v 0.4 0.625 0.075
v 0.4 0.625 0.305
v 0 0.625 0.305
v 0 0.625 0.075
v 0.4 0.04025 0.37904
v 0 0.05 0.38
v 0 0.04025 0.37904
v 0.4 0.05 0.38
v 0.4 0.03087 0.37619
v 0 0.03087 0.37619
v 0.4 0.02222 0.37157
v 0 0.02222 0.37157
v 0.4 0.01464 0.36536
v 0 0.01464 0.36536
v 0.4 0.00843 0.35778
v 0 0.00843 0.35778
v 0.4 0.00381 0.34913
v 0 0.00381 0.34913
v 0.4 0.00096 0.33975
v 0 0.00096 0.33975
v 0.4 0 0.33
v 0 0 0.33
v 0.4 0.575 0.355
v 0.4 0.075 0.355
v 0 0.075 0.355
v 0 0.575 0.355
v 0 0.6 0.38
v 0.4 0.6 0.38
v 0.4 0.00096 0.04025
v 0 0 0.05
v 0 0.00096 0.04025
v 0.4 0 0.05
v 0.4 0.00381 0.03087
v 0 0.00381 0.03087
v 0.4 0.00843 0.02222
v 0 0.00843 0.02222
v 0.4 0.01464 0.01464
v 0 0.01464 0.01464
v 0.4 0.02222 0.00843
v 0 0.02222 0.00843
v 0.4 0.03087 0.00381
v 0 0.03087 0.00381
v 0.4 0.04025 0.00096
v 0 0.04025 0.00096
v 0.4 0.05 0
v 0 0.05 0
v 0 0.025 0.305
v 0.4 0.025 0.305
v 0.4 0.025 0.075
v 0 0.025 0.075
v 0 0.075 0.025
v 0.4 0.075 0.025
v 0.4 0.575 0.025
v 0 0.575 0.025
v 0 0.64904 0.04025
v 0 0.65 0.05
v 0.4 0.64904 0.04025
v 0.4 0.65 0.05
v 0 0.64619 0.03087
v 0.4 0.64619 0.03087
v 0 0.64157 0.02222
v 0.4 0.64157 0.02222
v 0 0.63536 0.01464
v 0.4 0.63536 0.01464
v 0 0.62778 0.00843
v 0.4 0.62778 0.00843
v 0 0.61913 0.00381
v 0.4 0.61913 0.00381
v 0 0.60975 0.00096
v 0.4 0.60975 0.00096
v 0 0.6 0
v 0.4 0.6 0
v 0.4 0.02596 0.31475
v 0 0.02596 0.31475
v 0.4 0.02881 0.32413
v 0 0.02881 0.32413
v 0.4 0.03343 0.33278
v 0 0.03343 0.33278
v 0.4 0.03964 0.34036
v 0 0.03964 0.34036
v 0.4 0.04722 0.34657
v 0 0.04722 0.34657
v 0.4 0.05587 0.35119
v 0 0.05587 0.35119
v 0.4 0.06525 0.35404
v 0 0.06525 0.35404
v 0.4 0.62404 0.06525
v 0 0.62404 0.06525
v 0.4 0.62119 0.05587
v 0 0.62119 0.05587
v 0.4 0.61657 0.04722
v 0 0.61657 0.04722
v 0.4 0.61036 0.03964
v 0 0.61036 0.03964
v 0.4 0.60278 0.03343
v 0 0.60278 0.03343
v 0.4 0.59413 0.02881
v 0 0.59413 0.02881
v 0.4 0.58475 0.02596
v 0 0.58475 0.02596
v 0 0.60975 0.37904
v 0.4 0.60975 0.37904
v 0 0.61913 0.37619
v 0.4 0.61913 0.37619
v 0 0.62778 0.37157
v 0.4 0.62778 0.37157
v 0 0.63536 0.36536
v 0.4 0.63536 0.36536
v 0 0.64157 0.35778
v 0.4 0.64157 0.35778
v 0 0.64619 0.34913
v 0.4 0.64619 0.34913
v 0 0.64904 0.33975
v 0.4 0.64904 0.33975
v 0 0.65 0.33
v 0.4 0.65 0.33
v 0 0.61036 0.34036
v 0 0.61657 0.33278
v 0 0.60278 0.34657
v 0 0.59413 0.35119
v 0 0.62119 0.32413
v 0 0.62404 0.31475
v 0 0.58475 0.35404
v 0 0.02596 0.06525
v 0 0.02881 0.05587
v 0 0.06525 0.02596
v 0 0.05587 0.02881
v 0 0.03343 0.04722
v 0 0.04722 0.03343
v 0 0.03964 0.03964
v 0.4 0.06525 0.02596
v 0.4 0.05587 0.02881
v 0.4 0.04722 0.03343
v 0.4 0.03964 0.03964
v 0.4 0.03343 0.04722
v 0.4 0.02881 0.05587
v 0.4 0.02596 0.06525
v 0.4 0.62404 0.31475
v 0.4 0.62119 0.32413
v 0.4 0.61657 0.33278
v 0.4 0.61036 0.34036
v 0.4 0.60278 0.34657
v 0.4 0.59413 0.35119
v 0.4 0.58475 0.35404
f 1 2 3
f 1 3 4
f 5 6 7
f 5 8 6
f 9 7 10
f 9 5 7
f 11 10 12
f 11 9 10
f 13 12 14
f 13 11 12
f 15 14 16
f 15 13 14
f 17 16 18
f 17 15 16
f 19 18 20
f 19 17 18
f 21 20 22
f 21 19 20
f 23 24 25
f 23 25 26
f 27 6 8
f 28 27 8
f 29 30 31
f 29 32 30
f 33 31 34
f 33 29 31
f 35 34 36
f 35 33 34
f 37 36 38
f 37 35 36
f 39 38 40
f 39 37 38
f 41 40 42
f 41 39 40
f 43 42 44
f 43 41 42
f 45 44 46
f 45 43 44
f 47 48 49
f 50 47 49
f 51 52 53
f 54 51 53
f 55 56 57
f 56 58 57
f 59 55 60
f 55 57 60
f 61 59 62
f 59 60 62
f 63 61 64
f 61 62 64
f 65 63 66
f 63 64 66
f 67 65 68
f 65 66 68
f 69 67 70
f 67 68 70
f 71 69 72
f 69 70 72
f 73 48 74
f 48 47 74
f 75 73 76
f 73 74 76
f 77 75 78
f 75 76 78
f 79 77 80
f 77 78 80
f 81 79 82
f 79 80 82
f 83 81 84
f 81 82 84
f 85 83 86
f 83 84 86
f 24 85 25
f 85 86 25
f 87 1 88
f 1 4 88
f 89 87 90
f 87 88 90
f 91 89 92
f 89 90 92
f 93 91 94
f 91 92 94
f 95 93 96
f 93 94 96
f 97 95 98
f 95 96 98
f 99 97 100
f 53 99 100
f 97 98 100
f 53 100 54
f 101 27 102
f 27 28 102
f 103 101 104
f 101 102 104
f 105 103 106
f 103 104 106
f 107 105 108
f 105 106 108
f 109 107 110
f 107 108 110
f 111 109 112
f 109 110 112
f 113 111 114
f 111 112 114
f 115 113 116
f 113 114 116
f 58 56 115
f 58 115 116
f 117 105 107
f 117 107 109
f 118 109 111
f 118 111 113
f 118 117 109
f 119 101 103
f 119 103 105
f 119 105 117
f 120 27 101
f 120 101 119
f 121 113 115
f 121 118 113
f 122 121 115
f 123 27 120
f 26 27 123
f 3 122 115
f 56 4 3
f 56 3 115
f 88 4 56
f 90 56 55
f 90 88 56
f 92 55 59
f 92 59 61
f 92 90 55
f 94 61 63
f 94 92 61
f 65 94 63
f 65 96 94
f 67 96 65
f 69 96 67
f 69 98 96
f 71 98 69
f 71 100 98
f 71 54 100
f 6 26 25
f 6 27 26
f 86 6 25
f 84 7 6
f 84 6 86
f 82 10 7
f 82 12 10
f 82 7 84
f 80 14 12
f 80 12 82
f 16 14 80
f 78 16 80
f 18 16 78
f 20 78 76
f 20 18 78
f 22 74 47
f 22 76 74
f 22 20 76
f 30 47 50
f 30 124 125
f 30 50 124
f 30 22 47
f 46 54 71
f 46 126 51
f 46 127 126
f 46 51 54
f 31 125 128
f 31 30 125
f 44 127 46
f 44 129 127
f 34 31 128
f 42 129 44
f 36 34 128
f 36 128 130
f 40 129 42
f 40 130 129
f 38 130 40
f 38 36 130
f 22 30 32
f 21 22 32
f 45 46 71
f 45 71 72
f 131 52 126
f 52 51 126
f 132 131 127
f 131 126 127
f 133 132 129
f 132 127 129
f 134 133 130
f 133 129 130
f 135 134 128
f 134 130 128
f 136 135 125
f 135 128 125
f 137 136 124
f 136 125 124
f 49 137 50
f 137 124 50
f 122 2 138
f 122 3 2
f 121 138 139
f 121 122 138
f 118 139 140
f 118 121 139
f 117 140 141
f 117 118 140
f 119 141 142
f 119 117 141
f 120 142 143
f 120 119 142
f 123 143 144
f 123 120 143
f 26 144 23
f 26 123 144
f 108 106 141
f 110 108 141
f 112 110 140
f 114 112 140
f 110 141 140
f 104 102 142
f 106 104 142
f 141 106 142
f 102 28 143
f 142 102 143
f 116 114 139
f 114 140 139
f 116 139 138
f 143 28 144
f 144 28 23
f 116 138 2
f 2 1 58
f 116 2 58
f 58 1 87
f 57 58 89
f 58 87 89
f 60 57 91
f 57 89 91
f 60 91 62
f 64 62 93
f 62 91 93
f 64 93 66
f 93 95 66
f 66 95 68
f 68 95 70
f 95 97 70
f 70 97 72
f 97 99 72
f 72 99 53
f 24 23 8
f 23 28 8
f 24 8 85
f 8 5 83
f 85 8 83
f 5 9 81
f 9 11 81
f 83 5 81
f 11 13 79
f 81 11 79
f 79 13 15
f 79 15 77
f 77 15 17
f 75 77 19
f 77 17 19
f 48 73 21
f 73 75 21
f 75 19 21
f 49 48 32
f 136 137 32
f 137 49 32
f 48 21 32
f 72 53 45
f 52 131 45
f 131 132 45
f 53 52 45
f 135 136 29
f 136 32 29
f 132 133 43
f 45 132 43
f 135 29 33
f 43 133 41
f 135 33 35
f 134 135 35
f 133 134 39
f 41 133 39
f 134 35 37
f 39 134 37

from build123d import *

# Parameters (mm, degrees)
SKETCH1_W               = 0.4
SKETCH1_H               = 0.38
BOSS_EXTRUDE1_DEPTH     = 0.65
SKETCH2_W               = 0.33
SKETCH2_H               = 0.6
CUT_EXTRUDE1_DEPTH      = 1
CUT_EXTRUDE1_DEPTH_BACK = 1.4
FILLET1_R               = 0.05


with BuildPart() as part:
    # Sketch1 → Boss-Extrude1 (new body)
    with BuildSketch(Plane(origin=(0, 0, 0), x_dir=(1, 0, 0), z_dir=(0, 1, 0))):
        with Locations((0.2, -0.19)):
            Rectangle(SKETCH1_W, SKETCH1_H)
    extrude(amount=BOSS_EXTRUDE1_DEPTH)

    # Sketch2 → Cut-Extrude1 (cut, two sides)
    with BuildSketch(Plane(origin=(0.4, 0, 0), x_dir=(0, 0, -1), z_dir=(1, 0, 0))) as cut_extrude1_sk:
        with Locations((-0.19, 0.325)):
            Rectangle(SKETCH2_W, SKETCH2_H)
    extrude(amount=CUT_EXTRUDE1_DEPTH, mode=Mode.SUBTRACT)
    extrude(cut_extrude1_sk.sketch, amount=-CUT_EXTRUDE1_DEPTH_BACK, mode=Mode.SUBTRACT)

    # Fillet1
    fillet1_edges = [part.edges().sort_by_distance(p)[0] for p in [
        (0.2, 0.65, 0),
        (0.2, 0.025, 0.355),
        (0.2, 0.625, 0.355),
        (0.2, 0.625, 0.025),
        (0.2, 0.025, 0.025),
        (0.2, 0, 0),
        (0.2, 0, 0.38),
        (0.2, 0.65, 0.38),
    ]]
    fillet(fillet1_edges, radius=FILLET1_R)


solid = part.part
